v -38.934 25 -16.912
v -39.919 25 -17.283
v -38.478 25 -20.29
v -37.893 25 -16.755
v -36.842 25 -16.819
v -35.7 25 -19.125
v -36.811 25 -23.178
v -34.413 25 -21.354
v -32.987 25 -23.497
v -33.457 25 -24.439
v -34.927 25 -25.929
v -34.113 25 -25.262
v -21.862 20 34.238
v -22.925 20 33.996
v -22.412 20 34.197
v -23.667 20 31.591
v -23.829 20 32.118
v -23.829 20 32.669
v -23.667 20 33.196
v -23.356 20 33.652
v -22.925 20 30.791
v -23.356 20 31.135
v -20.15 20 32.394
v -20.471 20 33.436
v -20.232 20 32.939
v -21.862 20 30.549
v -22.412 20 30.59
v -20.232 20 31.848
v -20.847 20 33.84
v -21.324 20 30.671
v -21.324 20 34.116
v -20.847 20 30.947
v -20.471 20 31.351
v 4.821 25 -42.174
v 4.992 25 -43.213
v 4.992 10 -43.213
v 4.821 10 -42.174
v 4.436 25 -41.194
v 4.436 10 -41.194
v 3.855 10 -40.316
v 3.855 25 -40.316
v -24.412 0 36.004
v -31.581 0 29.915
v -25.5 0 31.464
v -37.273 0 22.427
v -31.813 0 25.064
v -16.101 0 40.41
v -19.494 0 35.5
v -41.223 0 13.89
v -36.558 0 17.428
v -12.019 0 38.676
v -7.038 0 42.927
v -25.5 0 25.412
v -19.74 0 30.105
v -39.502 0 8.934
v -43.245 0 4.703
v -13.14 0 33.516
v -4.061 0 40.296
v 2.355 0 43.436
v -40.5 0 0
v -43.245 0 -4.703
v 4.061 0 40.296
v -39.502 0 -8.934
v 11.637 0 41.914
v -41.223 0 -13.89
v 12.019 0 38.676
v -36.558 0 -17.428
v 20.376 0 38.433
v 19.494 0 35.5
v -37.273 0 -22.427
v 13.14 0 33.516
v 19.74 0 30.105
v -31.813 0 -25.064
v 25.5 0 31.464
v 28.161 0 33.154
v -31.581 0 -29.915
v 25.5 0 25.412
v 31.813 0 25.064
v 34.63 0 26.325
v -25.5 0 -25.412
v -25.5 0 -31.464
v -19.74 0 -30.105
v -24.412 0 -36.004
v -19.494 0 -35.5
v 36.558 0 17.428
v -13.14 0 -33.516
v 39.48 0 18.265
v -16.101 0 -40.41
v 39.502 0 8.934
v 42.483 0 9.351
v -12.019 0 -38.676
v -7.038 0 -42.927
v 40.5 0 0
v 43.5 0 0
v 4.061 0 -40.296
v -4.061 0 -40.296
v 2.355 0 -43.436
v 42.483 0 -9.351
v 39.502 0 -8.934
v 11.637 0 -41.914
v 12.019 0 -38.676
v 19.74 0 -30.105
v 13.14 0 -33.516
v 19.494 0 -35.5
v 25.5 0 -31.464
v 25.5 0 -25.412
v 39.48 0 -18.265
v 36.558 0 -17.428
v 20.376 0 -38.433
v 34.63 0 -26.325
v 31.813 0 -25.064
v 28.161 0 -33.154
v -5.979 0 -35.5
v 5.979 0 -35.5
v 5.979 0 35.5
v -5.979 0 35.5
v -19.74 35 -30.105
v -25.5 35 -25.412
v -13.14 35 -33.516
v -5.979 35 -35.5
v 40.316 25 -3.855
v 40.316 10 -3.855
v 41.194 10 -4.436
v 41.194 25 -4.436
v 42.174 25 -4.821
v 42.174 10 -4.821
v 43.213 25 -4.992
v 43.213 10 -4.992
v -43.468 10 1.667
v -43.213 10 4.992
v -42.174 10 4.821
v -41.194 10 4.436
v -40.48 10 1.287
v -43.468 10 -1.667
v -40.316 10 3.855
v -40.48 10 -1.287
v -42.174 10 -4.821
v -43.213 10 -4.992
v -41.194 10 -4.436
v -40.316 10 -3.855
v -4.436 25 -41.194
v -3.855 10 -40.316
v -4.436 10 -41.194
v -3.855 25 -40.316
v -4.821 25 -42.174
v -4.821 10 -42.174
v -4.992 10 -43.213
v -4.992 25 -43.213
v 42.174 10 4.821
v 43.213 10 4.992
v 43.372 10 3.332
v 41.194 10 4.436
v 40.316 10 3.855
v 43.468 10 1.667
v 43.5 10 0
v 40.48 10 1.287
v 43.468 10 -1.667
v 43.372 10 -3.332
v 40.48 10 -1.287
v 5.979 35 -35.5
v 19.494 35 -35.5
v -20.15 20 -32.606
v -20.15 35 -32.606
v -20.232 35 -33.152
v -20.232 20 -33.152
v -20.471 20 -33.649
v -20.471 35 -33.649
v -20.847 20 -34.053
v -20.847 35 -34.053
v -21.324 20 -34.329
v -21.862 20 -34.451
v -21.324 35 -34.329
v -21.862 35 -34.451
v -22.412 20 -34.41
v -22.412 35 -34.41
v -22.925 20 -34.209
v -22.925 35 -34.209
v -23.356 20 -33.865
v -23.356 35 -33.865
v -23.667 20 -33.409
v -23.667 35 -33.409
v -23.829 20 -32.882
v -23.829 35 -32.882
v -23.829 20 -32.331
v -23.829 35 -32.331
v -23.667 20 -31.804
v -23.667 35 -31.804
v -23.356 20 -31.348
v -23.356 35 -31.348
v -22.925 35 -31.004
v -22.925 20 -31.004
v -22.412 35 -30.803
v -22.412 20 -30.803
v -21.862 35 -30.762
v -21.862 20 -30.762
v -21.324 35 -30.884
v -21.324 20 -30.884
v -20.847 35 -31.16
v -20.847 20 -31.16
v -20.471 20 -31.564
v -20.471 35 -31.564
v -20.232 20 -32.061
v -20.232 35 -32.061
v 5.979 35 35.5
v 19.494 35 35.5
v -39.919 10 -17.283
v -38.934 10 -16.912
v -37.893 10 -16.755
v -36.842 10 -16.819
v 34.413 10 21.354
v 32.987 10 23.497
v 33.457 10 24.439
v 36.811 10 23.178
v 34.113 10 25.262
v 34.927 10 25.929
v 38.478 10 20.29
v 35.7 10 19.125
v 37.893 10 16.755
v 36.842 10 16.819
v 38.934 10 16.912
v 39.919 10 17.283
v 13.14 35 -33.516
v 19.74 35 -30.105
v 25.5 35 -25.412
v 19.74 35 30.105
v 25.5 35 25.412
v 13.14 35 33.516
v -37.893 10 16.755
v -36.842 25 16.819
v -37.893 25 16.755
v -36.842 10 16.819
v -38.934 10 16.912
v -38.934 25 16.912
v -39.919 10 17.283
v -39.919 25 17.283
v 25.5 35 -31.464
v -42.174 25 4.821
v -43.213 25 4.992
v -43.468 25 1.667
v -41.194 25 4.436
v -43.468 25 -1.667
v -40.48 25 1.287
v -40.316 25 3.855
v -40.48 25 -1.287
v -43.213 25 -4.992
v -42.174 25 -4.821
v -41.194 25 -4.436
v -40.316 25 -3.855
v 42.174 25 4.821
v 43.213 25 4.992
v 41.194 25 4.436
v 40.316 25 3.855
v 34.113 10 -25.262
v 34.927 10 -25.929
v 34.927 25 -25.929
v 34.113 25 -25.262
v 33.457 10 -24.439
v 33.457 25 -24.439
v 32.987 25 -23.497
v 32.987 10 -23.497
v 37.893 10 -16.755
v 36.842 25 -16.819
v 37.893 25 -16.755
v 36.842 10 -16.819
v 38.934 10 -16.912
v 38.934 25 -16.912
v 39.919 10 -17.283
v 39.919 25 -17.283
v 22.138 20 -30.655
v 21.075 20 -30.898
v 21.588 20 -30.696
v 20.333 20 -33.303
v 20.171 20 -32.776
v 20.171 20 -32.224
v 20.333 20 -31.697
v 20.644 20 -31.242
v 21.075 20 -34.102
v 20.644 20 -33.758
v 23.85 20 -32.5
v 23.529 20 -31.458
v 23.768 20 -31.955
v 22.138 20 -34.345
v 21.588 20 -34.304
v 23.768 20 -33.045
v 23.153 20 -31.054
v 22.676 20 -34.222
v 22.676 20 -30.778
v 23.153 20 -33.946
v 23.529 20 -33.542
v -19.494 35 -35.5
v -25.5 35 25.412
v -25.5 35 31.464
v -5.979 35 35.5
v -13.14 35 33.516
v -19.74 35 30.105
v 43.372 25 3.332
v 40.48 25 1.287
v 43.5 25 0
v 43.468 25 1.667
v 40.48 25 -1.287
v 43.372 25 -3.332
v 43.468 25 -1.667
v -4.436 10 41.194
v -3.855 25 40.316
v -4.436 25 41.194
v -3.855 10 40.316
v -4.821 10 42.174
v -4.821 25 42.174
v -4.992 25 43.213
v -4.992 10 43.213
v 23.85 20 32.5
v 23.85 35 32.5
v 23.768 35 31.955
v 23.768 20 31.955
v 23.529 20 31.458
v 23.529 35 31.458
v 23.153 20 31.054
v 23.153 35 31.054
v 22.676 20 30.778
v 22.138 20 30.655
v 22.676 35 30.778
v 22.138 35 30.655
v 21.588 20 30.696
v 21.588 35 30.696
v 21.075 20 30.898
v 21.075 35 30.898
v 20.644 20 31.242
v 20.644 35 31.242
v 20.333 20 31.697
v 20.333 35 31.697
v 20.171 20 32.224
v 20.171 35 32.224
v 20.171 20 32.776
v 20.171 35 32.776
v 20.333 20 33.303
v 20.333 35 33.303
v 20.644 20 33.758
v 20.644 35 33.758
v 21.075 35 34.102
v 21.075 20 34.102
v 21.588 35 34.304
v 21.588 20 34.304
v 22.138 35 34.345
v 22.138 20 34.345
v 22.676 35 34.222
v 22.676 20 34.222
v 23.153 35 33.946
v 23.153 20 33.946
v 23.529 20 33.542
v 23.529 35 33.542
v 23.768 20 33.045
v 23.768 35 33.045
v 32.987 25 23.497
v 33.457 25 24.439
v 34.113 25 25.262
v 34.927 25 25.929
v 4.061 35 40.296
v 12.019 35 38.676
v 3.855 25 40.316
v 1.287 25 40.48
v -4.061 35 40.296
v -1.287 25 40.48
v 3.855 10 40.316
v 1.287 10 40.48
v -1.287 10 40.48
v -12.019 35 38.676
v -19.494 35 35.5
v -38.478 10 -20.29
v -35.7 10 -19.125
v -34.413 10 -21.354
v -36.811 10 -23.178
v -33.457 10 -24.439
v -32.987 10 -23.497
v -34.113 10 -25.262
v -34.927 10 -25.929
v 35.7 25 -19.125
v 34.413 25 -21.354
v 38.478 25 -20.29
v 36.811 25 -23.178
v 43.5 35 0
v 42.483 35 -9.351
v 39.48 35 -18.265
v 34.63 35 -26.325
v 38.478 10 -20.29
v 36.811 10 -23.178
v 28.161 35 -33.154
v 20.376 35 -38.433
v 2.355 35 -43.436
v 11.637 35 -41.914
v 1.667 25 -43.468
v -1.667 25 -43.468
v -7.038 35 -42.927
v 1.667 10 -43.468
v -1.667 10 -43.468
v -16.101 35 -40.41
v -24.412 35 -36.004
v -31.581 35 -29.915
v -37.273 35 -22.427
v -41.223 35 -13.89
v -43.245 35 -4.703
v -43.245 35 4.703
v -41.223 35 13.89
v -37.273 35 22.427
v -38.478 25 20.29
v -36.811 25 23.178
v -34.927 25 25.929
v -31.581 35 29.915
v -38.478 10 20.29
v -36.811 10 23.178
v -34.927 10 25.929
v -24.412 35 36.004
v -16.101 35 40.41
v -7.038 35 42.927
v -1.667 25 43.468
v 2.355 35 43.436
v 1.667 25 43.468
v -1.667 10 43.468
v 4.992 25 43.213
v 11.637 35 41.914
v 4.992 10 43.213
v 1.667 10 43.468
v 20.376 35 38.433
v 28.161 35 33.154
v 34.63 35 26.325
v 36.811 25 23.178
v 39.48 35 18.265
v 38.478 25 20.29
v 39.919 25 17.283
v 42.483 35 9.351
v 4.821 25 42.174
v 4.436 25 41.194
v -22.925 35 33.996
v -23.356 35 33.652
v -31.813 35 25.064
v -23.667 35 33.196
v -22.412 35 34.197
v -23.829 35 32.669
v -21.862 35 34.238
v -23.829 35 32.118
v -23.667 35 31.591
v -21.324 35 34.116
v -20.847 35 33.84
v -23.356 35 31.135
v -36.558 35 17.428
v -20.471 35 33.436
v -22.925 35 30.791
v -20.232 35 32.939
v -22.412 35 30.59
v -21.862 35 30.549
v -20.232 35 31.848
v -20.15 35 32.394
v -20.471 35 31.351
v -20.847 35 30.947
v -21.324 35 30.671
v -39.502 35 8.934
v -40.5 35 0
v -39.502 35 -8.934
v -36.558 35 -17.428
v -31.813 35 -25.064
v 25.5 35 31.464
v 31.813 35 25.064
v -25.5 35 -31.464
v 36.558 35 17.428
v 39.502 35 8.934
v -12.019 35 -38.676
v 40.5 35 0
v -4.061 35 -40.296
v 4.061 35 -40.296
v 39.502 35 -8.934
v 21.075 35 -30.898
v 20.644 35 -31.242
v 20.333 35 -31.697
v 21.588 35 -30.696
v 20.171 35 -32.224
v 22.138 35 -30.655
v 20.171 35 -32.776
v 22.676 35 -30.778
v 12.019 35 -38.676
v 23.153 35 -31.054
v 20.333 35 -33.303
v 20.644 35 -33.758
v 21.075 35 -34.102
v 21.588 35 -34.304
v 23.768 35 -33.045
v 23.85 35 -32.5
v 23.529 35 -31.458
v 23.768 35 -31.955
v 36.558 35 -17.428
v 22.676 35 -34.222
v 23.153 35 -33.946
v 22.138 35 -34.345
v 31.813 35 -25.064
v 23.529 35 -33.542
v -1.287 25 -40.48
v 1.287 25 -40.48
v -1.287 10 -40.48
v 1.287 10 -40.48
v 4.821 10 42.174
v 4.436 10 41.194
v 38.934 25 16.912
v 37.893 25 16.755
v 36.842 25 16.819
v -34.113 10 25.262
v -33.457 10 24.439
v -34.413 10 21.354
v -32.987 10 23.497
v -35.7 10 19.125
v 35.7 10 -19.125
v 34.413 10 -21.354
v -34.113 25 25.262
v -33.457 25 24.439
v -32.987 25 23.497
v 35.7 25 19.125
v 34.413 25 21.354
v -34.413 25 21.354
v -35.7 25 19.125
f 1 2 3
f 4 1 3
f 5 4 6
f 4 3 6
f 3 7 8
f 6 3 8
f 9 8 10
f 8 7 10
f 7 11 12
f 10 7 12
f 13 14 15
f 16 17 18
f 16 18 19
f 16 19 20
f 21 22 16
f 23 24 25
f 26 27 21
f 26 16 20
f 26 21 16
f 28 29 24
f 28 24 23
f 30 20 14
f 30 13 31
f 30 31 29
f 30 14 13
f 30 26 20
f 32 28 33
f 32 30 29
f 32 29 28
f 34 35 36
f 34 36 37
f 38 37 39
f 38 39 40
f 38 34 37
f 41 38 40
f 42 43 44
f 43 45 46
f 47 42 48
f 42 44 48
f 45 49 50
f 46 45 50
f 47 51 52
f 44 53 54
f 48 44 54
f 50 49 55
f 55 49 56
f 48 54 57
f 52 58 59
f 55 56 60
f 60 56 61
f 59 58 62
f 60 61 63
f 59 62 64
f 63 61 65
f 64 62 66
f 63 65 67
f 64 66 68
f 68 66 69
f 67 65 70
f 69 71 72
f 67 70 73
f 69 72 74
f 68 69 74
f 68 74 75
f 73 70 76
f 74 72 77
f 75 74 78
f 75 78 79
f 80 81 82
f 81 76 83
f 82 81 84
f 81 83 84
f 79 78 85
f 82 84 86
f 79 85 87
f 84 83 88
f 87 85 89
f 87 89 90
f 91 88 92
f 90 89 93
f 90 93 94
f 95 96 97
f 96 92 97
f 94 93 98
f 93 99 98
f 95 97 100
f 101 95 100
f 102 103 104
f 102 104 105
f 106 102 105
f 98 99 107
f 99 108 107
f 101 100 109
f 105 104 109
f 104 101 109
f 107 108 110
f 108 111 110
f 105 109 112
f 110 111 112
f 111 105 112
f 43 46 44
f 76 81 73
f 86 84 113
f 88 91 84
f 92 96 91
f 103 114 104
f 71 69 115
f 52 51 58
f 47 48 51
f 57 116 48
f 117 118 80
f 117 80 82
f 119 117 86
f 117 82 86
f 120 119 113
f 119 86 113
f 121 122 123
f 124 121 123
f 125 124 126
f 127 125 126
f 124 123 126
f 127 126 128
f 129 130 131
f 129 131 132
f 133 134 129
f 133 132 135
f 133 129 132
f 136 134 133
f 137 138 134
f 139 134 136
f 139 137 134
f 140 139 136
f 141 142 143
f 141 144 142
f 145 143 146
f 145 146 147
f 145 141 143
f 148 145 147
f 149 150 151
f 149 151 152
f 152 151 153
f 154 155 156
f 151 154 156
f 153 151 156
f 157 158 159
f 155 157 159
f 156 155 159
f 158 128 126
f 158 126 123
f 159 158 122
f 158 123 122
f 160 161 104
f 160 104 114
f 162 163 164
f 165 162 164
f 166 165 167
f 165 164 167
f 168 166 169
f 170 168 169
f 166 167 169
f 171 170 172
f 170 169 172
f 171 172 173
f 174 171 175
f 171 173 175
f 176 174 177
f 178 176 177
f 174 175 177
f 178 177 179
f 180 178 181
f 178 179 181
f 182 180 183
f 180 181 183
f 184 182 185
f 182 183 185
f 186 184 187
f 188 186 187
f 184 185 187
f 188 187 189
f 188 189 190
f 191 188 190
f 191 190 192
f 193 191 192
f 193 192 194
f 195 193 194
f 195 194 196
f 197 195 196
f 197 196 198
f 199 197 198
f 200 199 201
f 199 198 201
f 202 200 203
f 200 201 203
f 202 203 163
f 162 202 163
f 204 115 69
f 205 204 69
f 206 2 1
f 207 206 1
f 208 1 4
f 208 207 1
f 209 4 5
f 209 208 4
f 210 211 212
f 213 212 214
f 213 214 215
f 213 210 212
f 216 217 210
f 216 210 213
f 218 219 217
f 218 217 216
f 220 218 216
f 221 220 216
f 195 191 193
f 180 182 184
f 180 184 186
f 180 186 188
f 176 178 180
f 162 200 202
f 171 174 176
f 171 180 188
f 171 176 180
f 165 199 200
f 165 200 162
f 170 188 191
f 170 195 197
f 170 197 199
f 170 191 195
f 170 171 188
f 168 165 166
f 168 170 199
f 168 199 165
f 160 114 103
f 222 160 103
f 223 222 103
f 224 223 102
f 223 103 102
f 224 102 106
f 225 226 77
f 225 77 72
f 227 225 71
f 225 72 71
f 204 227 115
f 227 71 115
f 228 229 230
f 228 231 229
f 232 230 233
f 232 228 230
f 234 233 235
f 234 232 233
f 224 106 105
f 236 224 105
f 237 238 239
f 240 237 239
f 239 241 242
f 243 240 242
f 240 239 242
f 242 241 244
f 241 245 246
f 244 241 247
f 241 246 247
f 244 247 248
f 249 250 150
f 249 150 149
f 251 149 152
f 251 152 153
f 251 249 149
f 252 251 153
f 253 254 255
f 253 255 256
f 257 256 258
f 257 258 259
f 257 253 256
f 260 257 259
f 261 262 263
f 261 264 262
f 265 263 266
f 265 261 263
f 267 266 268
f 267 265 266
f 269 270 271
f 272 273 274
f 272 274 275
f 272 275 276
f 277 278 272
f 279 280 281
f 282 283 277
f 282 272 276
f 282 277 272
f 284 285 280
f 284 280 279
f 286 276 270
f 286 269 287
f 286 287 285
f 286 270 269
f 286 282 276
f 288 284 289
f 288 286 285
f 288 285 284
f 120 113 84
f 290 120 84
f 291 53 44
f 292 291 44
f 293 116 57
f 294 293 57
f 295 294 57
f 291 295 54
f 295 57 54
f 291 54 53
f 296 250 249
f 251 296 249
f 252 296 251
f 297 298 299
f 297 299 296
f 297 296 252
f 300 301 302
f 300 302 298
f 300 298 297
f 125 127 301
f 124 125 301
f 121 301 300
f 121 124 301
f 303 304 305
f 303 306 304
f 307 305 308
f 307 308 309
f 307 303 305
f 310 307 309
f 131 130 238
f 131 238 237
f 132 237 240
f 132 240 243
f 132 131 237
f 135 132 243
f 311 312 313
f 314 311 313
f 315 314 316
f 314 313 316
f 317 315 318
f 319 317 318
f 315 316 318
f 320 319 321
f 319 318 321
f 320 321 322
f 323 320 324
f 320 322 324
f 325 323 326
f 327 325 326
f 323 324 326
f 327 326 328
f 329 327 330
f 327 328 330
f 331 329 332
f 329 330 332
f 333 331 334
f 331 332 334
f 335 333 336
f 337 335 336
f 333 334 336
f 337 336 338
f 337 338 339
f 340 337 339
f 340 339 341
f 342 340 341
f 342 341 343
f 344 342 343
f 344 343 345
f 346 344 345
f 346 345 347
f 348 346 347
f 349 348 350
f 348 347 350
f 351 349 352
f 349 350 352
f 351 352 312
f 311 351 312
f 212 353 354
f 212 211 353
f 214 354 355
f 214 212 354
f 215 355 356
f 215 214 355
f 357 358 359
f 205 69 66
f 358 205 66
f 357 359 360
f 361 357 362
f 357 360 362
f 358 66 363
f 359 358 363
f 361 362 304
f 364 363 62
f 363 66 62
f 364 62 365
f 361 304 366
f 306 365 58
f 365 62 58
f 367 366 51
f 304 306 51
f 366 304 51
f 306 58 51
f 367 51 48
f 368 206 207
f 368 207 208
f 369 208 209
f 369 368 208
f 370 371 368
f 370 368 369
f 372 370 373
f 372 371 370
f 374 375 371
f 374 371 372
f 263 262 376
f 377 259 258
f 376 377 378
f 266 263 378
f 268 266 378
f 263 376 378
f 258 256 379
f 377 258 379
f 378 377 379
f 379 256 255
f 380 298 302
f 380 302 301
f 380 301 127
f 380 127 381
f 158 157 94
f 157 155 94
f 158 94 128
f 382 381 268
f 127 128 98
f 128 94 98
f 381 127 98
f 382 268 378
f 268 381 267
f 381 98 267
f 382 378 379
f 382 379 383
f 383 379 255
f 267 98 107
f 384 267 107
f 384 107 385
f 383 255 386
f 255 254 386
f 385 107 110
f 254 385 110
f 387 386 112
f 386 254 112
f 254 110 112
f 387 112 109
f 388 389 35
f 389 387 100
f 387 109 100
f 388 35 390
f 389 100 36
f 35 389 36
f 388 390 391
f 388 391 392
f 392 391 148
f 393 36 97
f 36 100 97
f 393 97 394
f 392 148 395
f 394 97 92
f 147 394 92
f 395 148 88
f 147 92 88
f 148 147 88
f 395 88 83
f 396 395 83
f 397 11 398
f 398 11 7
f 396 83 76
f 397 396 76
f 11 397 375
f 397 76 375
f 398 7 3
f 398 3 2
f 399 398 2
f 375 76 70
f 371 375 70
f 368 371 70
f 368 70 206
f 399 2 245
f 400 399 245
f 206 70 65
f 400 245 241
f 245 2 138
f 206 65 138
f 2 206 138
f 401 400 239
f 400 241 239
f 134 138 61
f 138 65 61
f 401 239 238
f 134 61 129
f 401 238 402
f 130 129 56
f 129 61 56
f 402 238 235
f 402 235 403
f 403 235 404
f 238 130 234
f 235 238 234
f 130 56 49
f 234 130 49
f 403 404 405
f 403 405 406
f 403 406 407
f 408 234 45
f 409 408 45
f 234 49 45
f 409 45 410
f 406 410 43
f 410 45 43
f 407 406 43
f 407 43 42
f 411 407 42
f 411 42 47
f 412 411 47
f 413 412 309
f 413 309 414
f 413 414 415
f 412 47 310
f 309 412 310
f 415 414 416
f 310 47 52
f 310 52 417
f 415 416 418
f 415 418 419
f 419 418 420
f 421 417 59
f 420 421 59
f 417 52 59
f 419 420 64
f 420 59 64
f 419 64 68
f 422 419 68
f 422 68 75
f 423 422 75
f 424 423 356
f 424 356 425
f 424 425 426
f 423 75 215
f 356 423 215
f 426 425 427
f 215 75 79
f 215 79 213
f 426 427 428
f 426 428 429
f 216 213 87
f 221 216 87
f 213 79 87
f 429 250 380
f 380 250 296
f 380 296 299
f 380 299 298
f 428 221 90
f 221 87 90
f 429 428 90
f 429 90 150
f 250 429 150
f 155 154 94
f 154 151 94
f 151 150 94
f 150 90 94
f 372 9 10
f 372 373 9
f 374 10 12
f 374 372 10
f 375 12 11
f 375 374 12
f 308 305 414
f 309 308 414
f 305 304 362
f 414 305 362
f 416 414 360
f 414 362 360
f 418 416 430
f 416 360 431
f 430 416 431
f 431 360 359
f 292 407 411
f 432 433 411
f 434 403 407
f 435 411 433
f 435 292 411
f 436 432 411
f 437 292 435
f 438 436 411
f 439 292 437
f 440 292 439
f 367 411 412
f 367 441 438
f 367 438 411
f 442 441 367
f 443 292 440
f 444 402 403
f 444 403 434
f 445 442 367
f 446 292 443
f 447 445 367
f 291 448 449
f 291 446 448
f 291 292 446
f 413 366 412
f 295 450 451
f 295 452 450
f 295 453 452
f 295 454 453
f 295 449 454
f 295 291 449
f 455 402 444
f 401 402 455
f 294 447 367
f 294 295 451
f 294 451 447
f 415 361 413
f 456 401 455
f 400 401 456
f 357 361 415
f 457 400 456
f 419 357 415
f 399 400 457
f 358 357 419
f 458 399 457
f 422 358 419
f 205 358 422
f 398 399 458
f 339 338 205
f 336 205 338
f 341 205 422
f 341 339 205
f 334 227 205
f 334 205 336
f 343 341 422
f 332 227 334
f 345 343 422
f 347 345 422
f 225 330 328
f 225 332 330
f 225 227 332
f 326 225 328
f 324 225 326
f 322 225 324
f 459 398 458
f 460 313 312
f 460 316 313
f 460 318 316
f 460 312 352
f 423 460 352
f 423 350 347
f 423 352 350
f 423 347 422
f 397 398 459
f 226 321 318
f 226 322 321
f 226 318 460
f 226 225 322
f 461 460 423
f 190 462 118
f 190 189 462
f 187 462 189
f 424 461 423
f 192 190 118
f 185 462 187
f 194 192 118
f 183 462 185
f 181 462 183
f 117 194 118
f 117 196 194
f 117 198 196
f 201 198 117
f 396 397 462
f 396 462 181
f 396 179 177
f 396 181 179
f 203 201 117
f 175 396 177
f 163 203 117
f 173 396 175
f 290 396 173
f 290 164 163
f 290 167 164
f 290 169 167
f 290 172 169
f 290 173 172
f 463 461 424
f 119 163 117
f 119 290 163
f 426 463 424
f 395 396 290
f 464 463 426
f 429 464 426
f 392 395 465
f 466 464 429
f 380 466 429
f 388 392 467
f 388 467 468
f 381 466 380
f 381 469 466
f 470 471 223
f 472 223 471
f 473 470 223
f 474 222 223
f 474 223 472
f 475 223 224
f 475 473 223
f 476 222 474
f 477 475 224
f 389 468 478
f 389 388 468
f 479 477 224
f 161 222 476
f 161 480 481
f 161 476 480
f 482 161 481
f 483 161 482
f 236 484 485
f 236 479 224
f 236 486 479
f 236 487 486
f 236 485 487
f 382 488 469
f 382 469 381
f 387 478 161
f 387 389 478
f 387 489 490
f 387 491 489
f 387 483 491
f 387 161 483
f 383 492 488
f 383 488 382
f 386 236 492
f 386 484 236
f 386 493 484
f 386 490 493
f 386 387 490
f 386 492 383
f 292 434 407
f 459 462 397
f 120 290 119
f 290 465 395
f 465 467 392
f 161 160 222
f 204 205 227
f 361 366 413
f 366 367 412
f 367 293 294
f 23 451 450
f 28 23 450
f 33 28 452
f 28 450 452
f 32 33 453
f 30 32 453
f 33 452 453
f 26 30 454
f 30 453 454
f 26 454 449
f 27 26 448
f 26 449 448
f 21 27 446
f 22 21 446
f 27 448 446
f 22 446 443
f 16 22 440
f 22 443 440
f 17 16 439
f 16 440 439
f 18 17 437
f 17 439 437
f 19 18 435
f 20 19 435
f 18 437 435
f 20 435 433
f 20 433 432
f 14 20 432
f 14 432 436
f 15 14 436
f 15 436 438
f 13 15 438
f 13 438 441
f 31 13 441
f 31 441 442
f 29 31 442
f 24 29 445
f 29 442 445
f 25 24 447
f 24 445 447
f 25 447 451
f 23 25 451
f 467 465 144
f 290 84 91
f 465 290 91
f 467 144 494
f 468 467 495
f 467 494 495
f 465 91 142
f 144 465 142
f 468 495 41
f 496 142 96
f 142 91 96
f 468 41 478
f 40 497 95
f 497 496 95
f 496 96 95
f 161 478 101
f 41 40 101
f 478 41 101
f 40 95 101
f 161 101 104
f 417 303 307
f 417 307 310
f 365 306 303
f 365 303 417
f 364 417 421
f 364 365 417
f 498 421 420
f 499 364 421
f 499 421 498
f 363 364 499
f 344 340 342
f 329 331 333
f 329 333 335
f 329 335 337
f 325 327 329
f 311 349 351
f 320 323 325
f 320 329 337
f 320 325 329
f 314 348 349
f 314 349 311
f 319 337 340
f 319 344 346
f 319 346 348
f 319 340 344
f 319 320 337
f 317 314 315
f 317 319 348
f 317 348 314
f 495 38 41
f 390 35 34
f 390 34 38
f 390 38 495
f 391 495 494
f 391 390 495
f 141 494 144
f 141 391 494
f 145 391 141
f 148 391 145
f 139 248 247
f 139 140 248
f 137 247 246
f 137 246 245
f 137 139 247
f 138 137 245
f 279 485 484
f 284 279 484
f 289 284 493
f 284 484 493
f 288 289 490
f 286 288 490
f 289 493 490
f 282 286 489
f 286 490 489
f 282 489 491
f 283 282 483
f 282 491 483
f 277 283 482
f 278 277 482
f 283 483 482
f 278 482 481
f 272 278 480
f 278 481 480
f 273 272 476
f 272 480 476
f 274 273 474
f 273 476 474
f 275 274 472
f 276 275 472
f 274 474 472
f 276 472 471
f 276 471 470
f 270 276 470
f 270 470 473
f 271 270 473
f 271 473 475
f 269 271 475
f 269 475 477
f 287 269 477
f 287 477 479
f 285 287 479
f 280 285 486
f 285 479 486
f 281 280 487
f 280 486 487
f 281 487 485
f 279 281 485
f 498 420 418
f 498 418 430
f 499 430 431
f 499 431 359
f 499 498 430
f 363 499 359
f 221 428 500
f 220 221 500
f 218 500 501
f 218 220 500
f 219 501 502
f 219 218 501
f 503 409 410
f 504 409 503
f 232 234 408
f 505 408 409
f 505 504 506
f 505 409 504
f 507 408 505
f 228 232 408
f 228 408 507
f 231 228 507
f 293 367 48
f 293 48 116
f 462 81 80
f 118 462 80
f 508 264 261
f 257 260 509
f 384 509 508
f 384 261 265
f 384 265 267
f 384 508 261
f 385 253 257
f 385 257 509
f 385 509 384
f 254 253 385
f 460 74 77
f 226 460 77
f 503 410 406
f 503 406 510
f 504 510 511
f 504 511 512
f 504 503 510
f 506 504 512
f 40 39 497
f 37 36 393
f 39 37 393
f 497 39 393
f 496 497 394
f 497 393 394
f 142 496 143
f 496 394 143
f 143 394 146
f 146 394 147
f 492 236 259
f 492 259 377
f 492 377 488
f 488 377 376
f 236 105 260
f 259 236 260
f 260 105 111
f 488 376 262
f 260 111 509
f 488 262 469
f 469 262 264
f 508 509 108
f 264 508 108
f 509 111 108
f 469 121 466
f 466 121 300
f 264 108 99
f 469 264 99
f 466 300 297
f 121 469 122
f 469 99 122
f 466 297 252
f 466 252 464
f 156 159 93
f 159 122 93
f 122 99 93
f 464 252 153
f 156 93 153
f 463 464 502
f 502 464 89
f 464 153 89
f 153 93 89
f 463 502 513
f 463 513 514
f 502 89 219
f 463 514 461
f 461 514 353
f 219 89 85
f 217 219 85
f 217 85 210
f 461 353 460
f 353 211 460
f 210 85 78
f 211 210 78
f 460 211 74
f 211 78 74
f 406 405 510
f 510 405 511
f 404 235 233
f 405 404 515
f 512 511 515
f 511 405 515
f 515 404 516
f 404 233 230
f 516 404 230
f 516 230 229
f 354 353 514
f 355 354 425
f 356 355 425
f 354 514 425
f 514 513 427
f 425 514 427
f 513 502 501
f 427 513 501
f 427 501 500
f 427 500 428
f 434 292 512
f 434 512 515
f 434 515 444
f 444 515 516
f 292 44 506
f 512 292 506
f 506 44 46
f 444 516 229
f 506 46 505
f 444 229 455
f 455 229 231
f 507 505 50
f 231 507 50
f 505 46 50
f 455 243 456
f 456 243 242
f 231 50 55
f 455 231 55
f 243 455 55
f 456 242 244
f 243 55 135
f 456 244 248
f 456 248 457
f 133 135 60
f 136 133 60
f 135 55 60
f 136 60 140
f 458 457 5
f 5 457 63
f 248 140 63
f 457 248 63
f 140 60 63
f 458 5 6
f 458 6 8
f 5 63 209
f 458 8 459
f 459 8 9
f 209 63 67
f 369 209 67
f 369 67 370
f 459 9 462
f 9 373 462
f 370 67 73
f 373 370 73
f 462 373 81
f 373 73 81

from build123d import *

# Parameters (mm, degrees)
SKETCH1_R               = 43.5
SKETCH1_R_2             = 40.5
BOSS_EXTRUDE1_DEPTH     = 35
SKETCH2_R               = 1.85
CUT_EXTRUDE1_DEPTH      = 15
CUT_EXTRUDE3_DEPTH      = 7.5
CUT_EXTRUDE3_DEPTH_BACK = 7.5


with BuildPart() as part:
    # Sketch1 → Boss-Extrude1 (new body)
    with BuildSketch(Plane(origin=(0, 0, 0), x_dir=(1, 0, 0), z_dir=(0, 1, 0))):
        Circle(SKETCH1_R)
        Circle(SKETCH1_R_2, mode=Mode.SUBTRACT)
        with BuildLine():
            Line((-25.5, -25.411611519), (-25.5, -31.464265445))
            ThreePointArc((-25.5, -31.464265445), (-22.587110133, -33.616550327), (-19.49358869, -35.5))
            Line((-19.49358869, -35.5), (-5.979130372, -35.5))
            ThreePointArc((-5.979130372, -35.5), (-16.528091474, -31.981591459), (-25.5, -25.411611519))
        make_face()
        with BuildLine():
            Line((5.979130372, -35.5), (19.49358869, -35.5))
            ThreePointArc((19.49358869, -35.5), (22.587110133, -33.616550327), (25.5, -31.464265445))
            Line((25.5, -31.464265445), (25.5, -25.411611519))
            ThreePointArc((25.5, -25.411611519), (16.528091474, -31.981591459), (5.979130372, -35.5))
        make_face()
        with BuildLine():
            ThreePointArc((25.5, 31.464265445), (22.587110133, 33.616550327), (19.49358869, 35.5))
            Line((19.49358869, 35.5), (5.979130372, 35.5))
            ThreePointArc((5.979130372, 35.5), (16.528091474, 31.981591459), (25.5, 25.411611519))
            Line((25.5, 25.411611519), (25.5, 31.464265445))
        make_face()
        with BuildLine():
            ThreePointArc((-19.49358869, 35.5), (-22.587110133, 33.616550327), (-25.5, 31.464265445))
            Line((-25.5, 31.464265445), (-25.5, 25.411611519))
            ThreePointArc((-25.5, 25.411611519), (-16.528091474, 31.981591459), (-5.979130372, 35.5))
            Line((-5.979130372, 35.5), (-19.49358869, 35.5))
        make_face()
    extrude(amount=BOSS_EXTRUDE1_DEPTH)

    # Sketch2 → Cut-Extrude1 (cut)
    with BuildSketch(Plane(origin=(0, 35, 0), x_dir=(1, 0, 0), z_dir=(0, 1, 0))):
        with Locations((-22, 32.606393643)):
            Circle(SKETCH2_R)
        with Locations((22, 32.5)):
            Circle(SKETCH2_R)
        with Locations((22, -32.5)):
            Circle(SKETCH2_R)
        with Locations((-22, -32.393606357)):
            Circle(SKETCH2_R)
    extrude(amount=-CUT_EXTRUDE1_DEPTH, mode=Mode.SUBTRACT)

    # Sketch6 → Cut-Extrude3 (cut, two sides)
    with BuildSketch(Plane(origin=(0, 17.5, 0), x_dir=(1, 0, 0), z_dir=(0, 1, 0))) as cut_extrude3_sk:
        with BuildLine():
            ThreePointArc((-40.316091954, 3.855221077), (-41.673709906, 4.654531608), (-43.212643678, 4.991735805))
            ThreePointArc((-43.212643678, 4.991735805), (-43.5, 0), (-43.212643678, -4.991735805))
            ThreePointArc((-43.212643678, -4.991735805), (-41.673709906, -4.654531608), (-40.316091954, -3.855221077))
            ThreePointArc((-40.316091954, -3.855221077), (-40.5, 0), (-40.316091954, 3.855221077))
        make_face()
        with BuildLine():
            ThreePointArc((-39.919115092, -17.283351823), (-37.672105065, -21.75), (-34.927379288, -25.929291855))
            ThreePointArc((-34.927379288, -25.929291855), (-33.763225644, -24.867797568), (-32.987149275, -23.496765367))
            ThreePointArc((-32.987149275, -23.496765367), (-35.074028853, -20.25), (-36.842370352, -16.819326587))
            ThreePointArc((-36.842370352, -16.819326587), (-38.417757252, -16.805912337), (-39.919115092, -17.283351823))
        make_face()
        with BuildLine():
            ThreePointArc((4.991735805, -43.212643678), (4.654531608, -41.673709906), (3.855221077, -40.316091954))
            ThreePointArc((3.855221077, -40.316091954), (0, -40.5), (-3.855221077, -40.316091954))
            ThreePointArc((-3.855221077, -40.316091954), (-4.654531608, -41.673709906), (-4.991735805, -43.212643678))
            ThreePointArc((-4.991735805, -43.212643678), (0, -43.5), (4.991735805, -43.212643678))
        make_face()
        with BuildLine():
            ThreePointArc((34.927379288, -25.929291855), (37.672105065, -21.75), (39.919115092, -17.283351823))
            ThreePointArc((39.919115092, -17.283351823), (38.417757252, -16.805912337), (36.842370352, -16.819326587))
            ThreePointArc((36.842370352, -16.819326587), (35.074028853, -20.25), (32.987149275, -23.496765367))
            ThreePointArc((32.987149275, -23.496765367), (33.763225644, -24.867797568), (34.927379288, -25.929291855))
        make_face()
        with BuildLine():
            ThreePointArc((40.316091954, -3.855221077), (40.5, 0), (40.316091954, 3.855221077))
            ThreePointArc((40.316091954, 3.855221077), (41.673709906, 4.654531608), (43.212643678, 4.991735805))
            ThreePointArc((43.212643678, 4.991735805), (43.5, 0), (43.212643678, -4.991735805))
            ThreePointArc((43.212643678, -4.991735805), (41.673709906, -4.654531608), (40.316091954, -3.855221077))
        make_face()
        with BuildLine():
            ThreePointArc((39.919115092, 17.283351823), (37.672105065, 21.75), (34.927379288, 25.929291855))
            ThreePointArc((34.927379288, 25.929291855), (33.763225644, 24.867797568), (32.987149275, 23.496765367))
            ThreePointArc((32.987149275, 23.496765367), (35.074028853, 20.25), (36.842370352, 16.819326587))
            ThreePointArc((36.842370352, 16.819326587), (38.417757252, 16.805912337), (39.919115092, 17.283351823))
        make_face()
        with BuildLine():
            ThreePointArc((3.855221077, 40.316091954), (0, 40.5), (-3.855221077, 40.316091954))
            ThreePointArc((-3.855221077, 40.316091954), (-4.654531608, 41.673709906), (-4.991735805, 43.212643678))
            ThreePointArc((-4.991735805, 43.212643678), (0, 43.5), (4.991735805, 43.212643678))
            ThreePointArc((4.991735805, 43.212643678), (4.654531608, 41.673709906), (3.855221077, 40.316091954))
        make_face()
        with BuildLine():
            ThreePointArc((-34.927379288, 25.929291855), (-37.672105065, 21.75), (-39.919115092, 17.283351823))
            ThreePointArc((-39.919115092, 17.283351823), (-38.417757252, 16.805912337), (-36.842370352, 16.819326587))
            ThreePointArc((-36.842370352, 16.819326587), (-35.074028853, 20.25), (-32.987149275, 23.496765367))
            ThreePointArc((-32.987149275, 23.496765367), (-33.763225644, 24.867797568), (-34.927379288, 25.929291855))
        make_face()
    extrude(amount=CUT_EXTRUDE3_DEPTH, mode=Mode.SUBTRACT)
    extrude(cut_extrude3_sk.sketch, amount=-CUT_EXTRUDE3_DEPTH_BACK, mode=Mode.SUBTRACT)


solid = part.part
